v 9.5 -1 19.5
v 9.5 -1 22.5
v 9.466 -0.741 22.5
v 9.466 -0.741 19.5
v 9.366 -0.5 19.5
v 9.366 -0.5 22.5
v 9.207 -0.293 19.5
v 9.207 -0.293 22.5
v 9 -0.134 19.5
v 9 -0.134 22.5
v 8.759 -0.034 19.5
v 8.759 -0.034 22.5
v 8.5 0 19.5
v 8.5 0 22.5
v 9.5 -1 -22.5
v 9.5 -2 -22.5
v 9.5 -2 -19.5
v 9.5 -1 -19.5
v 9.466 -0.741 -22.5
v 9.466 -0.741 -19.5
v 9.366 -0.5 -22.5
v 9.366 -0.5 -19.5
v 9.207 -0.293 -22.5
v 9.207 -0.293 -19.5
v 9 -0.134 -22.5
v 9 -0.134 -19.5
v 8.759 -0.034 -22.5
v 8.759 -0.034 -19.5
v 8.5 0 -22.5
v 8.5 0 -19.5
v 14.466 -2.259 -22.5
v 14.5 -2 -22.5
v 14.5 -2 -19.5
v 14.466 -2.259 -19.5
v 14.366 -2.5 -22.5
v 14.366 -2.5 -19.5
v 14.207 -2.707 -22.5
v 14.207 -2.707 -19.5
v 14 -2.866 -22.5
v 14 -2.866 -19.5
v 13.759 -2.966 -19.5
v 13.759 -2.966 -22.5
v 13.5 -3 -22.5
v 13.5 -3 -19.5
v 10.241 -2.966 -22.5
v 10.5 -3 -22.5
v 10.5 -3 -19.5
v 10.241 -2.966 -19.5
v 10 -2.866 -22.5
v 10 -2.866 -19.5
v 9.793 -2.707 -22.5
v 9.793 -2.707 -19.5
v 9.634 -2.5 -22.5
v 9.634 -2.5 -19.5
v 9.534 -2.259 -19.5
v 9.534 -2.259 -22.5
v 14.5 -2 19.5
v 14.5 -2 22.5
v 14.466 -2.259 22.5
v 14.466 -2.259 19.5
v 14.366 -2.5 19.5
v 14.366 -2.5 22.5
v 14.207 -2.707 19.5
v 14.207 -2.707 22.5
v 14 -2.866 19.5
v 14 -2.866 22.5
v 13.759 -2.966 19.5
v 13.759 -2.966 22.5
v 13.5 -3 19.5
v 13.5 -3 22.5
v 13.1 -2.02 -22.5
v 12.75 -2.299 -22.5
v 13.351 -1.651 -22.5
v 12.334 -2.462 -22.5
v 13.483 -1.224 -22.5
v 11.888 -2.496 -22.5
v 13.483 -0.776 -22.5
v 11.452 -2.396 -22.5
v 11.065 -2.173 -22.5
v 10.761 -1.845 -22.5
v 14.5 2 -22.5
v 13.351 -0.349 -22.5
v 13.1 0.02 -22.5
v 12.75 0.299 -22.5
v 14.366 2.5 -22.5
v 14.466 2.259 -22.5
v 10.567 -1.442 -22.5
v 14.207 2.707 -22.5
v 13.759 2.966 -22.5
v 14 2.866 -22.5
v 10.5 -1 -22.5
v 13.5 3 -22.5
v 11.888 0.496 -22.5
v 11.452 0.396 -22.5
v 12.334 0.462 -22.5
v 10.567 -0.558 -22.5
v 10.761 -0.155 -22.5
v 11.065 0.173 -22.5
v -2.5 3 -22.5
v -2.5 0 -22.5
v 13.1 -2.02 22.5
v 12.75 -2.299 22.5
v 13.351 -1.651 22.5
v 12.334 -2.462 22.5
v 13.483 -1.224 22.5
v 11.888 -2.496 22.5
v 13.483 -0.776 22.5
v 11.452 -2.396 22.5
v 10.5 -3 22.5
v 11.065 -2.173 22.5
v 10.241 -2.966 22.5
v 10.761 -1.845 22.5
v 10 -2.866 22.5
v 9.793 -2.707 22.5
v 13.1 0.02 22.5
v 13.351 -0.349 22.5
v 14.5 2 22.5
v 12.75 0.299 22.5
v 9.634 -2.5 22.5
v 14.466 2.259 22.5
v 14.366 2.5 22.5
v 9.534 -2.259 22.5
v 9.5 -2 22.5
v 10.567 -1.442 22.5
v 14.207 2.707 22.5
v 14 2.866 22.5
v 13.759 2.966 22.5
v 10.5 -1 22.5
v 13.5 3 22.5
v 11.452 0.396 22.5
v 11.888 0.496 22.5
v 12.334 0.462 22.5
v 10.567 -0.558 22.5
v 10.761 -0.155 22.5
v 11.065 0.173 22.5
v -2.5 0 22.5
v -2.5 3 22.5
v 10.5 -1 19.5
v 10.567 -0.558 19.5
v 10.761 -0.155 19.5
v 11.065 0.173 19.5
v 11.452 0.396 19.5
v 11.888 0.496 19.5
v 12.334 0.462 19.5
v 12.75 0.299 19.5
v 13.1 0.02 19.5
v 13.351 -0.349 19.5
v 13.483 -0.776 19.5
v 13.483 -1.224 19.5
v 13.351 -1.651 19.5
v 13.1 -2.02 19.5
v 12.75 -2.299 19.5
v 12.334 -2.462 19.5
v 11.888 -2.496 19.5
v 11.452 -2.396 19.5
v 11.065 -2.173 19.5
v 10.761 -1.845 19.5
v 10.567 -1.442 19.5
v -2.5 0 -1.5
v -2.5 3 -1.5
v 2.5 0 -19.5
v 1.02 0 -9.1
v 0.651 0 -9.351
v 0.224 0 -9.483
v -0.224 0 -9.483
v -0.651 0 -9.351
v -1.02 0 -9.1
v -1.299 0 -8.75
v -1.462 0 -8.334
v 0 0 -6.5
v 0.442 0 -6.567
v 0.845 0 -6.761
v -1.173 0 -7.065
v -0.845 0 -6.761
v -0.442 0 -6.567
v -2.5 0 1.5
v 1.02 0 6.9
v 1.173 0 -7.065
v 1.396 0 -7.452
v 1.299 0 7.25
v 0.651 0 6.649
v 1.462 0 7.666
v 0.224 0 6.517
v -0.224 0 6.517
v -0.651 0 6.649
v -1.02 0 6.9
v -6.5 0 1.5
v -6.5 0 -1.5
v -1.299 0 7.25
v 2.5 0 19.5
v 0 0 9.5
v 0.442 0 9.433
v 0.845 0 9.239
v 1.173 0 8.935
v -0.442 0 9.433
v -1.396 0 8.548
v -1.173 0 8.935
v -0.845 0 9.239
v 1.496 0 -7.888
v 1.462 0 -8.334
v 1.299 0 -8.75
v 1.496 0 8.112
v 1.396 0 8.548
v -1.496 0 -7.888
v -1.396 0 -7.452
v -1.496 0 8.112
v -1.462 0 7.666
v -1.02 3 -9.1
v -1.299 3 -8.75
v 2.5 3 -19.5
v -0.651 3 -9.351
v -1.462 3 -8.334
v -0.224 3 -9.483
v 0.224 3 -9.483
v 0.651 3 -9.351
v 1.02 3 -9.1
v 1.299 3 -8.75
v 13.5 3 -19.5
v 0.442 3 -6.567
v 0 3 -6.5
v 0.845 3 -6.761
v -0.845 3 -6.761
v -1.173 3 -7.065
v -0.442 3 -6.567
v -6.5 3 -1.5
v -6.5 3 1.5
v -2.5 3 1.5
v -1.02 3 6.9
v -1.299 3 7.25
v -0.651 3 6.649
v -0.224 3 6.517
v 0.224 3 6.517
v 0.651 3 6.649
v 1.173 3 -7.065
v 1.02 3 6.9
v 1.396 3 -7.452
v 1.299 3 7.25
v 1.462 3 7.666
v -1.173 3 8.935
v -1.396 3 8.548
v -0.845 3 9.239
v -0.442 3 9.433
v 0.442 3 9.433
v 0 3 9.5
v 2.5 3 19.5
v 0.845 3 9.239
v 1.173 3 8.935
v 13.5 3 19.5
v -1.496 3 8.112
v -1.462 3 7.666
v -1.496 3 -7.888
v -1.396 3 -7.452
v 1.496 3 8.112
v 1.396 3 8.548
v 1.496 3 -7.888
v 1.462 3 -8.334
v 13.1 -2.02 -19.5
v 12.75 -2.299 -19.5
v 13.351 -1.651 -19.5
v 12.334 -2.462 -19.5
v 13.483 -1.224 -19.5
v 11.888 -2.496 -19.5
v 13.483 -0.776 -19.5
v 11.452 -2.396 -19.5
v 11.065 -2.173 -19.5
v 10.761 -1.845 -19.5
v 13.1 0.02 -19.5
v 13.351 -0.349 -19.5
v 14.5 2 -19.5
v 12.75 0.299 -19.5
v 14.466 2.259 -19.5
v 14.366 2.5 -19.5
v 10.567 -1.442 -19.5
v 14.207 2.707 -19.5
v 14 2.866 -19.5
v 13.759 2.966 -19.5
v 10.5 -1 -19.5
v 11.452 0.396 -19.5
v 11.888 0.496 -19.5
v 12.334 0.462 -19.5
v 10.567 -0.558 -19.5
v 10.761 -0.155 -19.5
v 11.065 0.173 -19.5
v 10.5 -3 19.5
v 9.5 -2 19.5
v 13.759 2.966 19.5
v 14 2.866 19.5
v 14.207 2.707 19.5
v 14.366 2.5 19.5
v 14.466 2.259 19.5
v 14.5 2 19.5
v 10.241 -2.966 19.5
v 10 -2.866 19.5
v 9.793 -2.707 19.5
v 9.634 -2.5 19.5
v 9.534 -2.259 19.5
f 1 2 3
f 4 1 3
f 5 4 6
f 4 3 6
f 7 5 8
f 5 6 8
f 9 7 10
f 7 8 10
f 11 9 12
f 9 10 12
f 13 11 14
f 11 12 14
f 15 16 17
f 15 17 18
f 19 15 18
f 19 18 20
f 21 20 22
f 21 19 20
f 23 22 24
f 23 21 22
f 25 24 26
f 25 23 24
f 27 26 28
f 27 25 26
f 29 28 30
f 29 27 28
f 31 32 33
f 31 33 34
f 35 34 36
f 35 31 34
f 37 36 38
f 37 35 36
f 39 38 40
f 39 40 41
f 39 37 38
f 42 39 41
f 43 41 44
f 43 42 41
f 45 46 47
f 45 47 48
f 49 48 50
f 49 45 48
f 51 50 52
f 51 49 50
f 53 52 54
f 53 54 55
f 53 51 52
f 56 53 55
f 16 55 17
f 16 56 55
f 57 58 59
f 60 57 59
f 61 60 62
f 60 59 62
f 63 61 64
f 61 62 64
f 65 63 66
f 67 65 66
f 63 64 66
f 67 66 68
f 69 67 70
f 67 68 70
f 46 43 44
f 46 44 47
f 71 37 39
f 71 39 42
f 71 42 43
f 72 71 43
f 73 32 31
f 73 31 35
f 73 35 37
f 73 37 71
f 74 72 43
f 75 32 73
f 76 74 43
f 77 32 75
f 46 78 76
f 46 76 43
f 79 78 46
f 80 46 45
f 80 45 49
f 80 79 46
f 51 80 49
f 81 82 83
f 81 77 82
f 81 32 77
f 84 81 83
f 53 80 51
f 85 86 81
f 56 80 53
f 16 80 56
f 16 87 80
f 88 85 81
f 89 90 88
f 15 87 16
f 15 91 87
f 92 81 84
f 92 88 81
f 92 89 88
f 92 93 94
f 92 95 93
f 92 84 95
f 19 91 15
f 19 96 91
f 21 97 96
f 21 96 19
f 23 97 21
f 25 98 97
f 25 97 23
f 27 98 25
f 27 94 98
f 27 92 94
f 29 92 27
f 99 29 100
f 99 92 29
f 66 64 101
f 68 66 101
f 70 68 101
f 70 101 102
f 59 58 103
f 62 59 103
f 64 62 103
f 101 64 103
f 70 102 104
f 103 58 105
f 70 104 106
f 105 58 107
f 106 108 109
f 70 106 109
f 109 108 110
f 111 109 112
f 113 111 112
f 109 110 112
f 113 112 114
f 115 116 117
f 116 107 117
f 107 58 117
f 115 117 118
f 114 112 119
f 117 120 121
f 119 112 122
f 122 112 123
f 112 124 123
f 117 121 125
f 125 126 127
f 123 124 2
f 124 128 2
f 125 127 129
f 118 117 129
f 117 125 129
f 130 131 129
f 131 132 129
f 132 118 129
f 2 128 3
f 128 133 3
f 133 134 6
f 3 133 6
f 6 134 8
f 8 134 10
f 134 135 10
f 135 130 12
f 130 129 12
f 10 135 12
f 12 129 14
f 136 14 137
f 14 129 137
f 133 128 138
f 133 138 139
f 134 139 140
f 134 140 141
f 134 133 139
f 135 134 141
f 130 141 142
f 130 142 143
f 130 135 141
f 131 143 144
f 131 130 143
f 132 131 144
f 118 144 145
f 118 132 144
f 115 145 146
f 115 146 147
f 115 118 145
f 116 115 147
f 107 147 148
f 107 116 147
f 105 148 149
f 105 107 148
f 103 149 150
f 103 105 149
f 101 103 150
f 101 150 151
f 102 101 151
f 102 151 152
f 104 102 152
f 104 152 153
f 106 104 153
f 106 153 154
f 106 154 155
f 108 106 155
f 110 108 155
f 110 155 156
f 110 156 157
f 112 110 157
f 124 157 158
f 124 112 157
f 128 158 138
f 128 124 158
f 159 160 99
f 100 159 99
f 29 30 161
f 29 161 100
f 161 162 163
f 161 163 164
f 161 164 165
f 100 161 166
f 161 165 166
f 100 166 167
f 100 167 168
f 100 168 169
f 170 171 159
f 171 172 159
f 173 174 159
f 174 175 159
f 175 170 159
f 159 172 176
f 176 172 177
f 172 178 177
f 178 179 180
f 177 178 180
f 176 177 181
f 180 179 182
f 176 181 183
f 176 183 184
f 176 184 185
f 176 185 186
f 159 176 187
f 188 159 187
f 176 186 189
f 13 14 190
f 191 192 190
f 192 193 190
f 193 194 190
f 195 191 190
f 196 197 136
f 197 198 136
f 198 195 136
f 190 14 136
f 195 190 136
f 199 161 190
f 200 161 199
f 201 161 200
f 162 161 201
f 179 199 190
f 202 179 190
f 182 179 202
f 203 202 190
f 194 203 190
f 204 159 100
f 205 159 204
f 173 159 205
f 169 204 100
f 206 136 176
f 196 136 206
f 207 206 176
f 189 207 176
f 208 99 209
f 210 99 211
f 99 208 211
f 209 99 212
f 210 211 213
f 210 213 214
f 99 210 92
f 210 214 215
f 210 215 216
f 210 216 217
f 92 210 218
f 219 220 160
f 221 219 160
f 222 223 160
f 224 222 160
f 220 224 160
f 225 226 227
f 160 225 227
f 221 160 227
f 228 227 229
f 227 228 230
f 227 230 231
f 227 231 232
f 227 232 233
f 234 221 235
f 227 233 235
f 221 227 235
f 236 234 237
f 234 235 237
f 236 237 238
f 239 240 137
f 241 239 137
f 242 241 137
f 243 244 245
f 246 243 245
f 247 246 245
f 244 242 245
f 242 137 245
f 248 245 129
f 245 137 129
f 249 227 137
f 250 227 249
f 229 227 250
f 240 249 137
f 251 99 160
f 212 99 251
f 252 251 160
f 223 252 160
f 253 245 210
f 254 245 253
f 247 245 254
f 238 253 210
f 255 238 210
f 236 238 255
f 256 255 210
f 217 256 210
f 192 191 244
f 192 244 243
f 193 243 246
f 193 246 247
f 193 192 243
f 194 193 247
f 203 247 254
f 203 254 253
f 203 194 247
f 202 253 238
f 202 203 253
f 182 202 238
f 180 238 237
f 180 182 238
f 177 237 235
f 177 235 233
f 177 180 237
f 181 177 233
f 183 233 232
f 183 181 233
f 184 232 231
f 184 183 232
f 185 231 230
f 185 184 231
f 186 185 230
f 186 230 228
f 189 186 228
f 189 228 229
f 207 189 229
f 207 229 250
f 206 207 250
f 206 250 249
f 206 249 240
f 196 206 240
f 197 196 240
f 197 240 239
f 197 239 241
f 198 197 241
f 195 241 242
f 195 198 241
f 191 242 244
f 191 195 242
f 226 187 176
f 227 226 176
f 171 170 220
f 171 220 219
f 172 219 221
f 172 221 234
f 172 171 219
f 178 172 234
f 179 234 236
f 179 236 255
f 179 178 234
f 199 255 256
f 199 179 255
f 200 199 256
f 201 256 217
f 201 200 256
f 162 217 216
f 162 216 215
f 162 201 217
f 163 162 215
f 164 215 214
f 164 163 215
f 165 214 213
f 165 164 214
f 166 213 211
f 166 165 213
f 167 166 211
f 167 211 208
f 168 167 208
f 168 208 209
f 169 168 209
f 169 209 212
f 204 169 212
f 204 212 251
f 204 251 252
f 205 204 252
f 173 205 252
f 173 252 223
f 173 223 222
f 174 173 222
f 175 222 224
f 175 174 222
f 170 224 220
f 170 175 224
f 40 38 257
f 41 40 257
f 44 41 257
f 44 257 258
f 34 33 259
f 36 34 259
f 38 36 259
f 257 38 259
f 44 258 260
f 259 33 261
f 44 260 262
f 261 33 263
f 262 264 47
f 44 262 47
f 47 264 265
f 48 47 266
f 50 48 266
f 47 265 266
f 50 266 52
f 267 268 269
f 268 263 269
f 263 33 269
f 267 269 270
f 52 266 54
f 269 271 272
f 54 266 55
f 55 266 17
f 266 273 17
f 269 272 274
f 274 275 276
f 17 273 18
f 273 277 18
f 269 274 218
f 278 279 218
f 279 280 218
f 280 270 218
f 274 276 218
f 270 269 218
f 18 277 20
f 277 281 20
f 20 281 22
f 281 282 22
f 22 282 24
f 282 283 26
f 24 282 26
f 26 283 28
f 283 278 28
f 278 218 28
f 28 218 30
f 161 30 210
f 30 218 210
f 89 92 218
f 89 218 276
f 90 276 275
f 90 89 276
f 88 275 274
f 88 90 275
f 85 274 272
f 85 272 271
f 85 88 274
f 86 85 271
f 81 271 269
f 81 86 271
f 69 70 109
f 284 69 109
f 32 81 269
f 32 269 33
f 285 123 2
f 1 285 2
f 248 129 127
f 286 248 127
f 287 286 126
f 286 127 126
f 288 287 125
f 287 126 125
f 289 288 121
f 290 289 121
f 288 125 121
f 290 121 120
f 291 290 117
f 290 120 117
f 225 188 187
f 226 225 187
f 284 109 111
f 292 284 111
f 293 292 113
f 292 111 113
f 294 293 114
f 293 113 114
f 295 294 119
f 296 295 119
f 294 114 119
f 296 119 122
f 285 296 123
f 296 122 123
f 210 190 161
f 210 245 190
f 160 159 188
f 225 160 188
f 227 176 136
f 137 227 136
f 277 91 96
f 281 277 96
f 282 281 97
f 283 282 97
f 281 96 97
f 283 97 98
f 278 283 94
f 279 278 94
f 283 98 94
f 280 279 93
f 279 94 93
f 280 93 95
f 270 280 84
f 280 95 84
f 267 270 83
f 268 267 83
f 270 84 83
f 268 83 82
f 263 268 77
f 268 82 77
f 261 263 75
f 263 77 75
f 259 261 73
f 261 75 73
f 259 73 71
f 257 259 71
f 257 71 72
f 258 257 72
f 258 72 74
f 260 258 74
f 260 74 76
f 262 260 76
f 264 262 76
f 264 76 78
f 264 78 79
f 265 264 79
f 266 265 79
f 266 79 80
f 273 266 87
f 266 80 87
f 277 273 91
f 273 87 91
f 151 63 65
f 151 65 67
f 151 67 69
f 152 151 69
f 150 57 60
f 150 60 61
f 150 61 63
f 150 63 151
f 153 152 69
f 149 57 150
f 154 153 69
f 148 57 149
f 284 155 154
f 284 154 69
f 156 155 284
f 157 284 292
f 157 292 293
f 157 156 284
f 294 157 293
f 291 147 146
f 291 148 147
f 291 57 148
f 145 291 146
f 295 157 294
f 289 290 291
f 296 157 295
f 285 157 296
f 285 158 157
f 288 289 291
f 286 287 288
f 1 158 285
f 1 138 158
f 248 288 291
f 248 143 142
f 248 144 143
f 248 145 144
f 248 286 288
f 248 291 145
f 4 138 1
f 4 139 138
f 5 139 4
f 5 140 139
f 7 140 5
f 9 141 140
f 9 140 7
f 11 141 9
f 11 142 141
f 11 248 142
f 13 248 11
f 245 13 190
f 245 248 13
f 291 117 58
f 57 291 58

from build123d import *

# Parameters (mm, degrees)
SKETCH_1_R      = 1.5
EXTRUDE_1_DEPTH = 3
SKETCH_3_W      = 5
SKETCH_3_H      = 12
EXTRUDE_2_DEPTH = 3
SKETCH_4_R      = 1.5
EXTRUDE_3_DEPTH = 3


with BuildPart() as part:
    # 草图1 → 凸台-拉伸1 (new body)
    with BuildSketch(Plane(origin=(0, 0, 0), x_dir=(1, 0, 0), z_dir=(0, 1, 0))):
        Polygon((-2.5, -1.5), (-2.5, -10.5), (2.5, -10.5), (2.5, 10.5), (-2.5, 10.5), (-2.5, 1.5), (-6.5, 1.5), (-6.5, -1.5), align=None)
        with Locations(Location((0, 8, 0), (0, 0, 270))):
            Circle(SKETCH_1_R, mode=Mode.SUBTRACT)
        with Locations(Location((0, -8, 0), (0, 0, 270))):
            Circle(SKETCH_1_R, mode=Mode.SUBTRACT)
    extrude(amount=EXTRUDE_1_DEPTH)

    # 草图3 → 凸台-拉伸2 (add)
    with BuildSketch(Plane(origin=(0, 3, 0), x_dir=(1, 0, 0), z_dir=(0, 1, 0))):
        with Locations((0, 16.5)):
            Rectangle(SKETCH_3_W, SKETCH_3_H)
        with Locations((0, -16.5)):
            Rectangle(SKETCH_3_W, SKETCH_3_H)
    extrude(amount=-EXTRUDE_2_DEPTH)

    # 草图4 → 凸台-拉伸3 (add)
    with BuildSketch(Plane(origin=(0, 0, -22.5), x_dir=(-1, 0, 0), z_dir=(0, 0, -1))):
        with BuildLine():
            Line((-2.5, 3), (-13.5, 3))
            ThreePointArc((-13.5, 3), (-14.207106781, 2.707106781), (-14.5, 2))
            Line((-14.5, 2), (-14.5, -2))
            ThreePointArc((-14.5, -2), (-14.207106781, -2.707106781), (-13.5, -3))
            Line((-13.5, -3), (-10.5, -3))
            ThreePointArc((-10.5, -3), (-9.792893219, -2.707106781), (-9.5, -2))
            Line((-9.5, -2), (-9.5, -1))
            ThreePointArc((-9.5, -1), (-9.207106781, -0.292893219), (-8.5, 0))
            Line((-8.5, 0), (-2.5, 0))
            Line((-2.5, 0), (-2.5, 3))
        make_face()
        with Locations((-12, -1)):
            Circle(SKETCH_4_R, mode=Mode.SUBTRACT)
    extrude_3 = extrude(amount=-EXTRUDE_3_DEPTH)

    # 镜向1: 凸台-拉伸3 across plane
    add(extrude_3.mirror(Plane.XY))


solid = part.part
